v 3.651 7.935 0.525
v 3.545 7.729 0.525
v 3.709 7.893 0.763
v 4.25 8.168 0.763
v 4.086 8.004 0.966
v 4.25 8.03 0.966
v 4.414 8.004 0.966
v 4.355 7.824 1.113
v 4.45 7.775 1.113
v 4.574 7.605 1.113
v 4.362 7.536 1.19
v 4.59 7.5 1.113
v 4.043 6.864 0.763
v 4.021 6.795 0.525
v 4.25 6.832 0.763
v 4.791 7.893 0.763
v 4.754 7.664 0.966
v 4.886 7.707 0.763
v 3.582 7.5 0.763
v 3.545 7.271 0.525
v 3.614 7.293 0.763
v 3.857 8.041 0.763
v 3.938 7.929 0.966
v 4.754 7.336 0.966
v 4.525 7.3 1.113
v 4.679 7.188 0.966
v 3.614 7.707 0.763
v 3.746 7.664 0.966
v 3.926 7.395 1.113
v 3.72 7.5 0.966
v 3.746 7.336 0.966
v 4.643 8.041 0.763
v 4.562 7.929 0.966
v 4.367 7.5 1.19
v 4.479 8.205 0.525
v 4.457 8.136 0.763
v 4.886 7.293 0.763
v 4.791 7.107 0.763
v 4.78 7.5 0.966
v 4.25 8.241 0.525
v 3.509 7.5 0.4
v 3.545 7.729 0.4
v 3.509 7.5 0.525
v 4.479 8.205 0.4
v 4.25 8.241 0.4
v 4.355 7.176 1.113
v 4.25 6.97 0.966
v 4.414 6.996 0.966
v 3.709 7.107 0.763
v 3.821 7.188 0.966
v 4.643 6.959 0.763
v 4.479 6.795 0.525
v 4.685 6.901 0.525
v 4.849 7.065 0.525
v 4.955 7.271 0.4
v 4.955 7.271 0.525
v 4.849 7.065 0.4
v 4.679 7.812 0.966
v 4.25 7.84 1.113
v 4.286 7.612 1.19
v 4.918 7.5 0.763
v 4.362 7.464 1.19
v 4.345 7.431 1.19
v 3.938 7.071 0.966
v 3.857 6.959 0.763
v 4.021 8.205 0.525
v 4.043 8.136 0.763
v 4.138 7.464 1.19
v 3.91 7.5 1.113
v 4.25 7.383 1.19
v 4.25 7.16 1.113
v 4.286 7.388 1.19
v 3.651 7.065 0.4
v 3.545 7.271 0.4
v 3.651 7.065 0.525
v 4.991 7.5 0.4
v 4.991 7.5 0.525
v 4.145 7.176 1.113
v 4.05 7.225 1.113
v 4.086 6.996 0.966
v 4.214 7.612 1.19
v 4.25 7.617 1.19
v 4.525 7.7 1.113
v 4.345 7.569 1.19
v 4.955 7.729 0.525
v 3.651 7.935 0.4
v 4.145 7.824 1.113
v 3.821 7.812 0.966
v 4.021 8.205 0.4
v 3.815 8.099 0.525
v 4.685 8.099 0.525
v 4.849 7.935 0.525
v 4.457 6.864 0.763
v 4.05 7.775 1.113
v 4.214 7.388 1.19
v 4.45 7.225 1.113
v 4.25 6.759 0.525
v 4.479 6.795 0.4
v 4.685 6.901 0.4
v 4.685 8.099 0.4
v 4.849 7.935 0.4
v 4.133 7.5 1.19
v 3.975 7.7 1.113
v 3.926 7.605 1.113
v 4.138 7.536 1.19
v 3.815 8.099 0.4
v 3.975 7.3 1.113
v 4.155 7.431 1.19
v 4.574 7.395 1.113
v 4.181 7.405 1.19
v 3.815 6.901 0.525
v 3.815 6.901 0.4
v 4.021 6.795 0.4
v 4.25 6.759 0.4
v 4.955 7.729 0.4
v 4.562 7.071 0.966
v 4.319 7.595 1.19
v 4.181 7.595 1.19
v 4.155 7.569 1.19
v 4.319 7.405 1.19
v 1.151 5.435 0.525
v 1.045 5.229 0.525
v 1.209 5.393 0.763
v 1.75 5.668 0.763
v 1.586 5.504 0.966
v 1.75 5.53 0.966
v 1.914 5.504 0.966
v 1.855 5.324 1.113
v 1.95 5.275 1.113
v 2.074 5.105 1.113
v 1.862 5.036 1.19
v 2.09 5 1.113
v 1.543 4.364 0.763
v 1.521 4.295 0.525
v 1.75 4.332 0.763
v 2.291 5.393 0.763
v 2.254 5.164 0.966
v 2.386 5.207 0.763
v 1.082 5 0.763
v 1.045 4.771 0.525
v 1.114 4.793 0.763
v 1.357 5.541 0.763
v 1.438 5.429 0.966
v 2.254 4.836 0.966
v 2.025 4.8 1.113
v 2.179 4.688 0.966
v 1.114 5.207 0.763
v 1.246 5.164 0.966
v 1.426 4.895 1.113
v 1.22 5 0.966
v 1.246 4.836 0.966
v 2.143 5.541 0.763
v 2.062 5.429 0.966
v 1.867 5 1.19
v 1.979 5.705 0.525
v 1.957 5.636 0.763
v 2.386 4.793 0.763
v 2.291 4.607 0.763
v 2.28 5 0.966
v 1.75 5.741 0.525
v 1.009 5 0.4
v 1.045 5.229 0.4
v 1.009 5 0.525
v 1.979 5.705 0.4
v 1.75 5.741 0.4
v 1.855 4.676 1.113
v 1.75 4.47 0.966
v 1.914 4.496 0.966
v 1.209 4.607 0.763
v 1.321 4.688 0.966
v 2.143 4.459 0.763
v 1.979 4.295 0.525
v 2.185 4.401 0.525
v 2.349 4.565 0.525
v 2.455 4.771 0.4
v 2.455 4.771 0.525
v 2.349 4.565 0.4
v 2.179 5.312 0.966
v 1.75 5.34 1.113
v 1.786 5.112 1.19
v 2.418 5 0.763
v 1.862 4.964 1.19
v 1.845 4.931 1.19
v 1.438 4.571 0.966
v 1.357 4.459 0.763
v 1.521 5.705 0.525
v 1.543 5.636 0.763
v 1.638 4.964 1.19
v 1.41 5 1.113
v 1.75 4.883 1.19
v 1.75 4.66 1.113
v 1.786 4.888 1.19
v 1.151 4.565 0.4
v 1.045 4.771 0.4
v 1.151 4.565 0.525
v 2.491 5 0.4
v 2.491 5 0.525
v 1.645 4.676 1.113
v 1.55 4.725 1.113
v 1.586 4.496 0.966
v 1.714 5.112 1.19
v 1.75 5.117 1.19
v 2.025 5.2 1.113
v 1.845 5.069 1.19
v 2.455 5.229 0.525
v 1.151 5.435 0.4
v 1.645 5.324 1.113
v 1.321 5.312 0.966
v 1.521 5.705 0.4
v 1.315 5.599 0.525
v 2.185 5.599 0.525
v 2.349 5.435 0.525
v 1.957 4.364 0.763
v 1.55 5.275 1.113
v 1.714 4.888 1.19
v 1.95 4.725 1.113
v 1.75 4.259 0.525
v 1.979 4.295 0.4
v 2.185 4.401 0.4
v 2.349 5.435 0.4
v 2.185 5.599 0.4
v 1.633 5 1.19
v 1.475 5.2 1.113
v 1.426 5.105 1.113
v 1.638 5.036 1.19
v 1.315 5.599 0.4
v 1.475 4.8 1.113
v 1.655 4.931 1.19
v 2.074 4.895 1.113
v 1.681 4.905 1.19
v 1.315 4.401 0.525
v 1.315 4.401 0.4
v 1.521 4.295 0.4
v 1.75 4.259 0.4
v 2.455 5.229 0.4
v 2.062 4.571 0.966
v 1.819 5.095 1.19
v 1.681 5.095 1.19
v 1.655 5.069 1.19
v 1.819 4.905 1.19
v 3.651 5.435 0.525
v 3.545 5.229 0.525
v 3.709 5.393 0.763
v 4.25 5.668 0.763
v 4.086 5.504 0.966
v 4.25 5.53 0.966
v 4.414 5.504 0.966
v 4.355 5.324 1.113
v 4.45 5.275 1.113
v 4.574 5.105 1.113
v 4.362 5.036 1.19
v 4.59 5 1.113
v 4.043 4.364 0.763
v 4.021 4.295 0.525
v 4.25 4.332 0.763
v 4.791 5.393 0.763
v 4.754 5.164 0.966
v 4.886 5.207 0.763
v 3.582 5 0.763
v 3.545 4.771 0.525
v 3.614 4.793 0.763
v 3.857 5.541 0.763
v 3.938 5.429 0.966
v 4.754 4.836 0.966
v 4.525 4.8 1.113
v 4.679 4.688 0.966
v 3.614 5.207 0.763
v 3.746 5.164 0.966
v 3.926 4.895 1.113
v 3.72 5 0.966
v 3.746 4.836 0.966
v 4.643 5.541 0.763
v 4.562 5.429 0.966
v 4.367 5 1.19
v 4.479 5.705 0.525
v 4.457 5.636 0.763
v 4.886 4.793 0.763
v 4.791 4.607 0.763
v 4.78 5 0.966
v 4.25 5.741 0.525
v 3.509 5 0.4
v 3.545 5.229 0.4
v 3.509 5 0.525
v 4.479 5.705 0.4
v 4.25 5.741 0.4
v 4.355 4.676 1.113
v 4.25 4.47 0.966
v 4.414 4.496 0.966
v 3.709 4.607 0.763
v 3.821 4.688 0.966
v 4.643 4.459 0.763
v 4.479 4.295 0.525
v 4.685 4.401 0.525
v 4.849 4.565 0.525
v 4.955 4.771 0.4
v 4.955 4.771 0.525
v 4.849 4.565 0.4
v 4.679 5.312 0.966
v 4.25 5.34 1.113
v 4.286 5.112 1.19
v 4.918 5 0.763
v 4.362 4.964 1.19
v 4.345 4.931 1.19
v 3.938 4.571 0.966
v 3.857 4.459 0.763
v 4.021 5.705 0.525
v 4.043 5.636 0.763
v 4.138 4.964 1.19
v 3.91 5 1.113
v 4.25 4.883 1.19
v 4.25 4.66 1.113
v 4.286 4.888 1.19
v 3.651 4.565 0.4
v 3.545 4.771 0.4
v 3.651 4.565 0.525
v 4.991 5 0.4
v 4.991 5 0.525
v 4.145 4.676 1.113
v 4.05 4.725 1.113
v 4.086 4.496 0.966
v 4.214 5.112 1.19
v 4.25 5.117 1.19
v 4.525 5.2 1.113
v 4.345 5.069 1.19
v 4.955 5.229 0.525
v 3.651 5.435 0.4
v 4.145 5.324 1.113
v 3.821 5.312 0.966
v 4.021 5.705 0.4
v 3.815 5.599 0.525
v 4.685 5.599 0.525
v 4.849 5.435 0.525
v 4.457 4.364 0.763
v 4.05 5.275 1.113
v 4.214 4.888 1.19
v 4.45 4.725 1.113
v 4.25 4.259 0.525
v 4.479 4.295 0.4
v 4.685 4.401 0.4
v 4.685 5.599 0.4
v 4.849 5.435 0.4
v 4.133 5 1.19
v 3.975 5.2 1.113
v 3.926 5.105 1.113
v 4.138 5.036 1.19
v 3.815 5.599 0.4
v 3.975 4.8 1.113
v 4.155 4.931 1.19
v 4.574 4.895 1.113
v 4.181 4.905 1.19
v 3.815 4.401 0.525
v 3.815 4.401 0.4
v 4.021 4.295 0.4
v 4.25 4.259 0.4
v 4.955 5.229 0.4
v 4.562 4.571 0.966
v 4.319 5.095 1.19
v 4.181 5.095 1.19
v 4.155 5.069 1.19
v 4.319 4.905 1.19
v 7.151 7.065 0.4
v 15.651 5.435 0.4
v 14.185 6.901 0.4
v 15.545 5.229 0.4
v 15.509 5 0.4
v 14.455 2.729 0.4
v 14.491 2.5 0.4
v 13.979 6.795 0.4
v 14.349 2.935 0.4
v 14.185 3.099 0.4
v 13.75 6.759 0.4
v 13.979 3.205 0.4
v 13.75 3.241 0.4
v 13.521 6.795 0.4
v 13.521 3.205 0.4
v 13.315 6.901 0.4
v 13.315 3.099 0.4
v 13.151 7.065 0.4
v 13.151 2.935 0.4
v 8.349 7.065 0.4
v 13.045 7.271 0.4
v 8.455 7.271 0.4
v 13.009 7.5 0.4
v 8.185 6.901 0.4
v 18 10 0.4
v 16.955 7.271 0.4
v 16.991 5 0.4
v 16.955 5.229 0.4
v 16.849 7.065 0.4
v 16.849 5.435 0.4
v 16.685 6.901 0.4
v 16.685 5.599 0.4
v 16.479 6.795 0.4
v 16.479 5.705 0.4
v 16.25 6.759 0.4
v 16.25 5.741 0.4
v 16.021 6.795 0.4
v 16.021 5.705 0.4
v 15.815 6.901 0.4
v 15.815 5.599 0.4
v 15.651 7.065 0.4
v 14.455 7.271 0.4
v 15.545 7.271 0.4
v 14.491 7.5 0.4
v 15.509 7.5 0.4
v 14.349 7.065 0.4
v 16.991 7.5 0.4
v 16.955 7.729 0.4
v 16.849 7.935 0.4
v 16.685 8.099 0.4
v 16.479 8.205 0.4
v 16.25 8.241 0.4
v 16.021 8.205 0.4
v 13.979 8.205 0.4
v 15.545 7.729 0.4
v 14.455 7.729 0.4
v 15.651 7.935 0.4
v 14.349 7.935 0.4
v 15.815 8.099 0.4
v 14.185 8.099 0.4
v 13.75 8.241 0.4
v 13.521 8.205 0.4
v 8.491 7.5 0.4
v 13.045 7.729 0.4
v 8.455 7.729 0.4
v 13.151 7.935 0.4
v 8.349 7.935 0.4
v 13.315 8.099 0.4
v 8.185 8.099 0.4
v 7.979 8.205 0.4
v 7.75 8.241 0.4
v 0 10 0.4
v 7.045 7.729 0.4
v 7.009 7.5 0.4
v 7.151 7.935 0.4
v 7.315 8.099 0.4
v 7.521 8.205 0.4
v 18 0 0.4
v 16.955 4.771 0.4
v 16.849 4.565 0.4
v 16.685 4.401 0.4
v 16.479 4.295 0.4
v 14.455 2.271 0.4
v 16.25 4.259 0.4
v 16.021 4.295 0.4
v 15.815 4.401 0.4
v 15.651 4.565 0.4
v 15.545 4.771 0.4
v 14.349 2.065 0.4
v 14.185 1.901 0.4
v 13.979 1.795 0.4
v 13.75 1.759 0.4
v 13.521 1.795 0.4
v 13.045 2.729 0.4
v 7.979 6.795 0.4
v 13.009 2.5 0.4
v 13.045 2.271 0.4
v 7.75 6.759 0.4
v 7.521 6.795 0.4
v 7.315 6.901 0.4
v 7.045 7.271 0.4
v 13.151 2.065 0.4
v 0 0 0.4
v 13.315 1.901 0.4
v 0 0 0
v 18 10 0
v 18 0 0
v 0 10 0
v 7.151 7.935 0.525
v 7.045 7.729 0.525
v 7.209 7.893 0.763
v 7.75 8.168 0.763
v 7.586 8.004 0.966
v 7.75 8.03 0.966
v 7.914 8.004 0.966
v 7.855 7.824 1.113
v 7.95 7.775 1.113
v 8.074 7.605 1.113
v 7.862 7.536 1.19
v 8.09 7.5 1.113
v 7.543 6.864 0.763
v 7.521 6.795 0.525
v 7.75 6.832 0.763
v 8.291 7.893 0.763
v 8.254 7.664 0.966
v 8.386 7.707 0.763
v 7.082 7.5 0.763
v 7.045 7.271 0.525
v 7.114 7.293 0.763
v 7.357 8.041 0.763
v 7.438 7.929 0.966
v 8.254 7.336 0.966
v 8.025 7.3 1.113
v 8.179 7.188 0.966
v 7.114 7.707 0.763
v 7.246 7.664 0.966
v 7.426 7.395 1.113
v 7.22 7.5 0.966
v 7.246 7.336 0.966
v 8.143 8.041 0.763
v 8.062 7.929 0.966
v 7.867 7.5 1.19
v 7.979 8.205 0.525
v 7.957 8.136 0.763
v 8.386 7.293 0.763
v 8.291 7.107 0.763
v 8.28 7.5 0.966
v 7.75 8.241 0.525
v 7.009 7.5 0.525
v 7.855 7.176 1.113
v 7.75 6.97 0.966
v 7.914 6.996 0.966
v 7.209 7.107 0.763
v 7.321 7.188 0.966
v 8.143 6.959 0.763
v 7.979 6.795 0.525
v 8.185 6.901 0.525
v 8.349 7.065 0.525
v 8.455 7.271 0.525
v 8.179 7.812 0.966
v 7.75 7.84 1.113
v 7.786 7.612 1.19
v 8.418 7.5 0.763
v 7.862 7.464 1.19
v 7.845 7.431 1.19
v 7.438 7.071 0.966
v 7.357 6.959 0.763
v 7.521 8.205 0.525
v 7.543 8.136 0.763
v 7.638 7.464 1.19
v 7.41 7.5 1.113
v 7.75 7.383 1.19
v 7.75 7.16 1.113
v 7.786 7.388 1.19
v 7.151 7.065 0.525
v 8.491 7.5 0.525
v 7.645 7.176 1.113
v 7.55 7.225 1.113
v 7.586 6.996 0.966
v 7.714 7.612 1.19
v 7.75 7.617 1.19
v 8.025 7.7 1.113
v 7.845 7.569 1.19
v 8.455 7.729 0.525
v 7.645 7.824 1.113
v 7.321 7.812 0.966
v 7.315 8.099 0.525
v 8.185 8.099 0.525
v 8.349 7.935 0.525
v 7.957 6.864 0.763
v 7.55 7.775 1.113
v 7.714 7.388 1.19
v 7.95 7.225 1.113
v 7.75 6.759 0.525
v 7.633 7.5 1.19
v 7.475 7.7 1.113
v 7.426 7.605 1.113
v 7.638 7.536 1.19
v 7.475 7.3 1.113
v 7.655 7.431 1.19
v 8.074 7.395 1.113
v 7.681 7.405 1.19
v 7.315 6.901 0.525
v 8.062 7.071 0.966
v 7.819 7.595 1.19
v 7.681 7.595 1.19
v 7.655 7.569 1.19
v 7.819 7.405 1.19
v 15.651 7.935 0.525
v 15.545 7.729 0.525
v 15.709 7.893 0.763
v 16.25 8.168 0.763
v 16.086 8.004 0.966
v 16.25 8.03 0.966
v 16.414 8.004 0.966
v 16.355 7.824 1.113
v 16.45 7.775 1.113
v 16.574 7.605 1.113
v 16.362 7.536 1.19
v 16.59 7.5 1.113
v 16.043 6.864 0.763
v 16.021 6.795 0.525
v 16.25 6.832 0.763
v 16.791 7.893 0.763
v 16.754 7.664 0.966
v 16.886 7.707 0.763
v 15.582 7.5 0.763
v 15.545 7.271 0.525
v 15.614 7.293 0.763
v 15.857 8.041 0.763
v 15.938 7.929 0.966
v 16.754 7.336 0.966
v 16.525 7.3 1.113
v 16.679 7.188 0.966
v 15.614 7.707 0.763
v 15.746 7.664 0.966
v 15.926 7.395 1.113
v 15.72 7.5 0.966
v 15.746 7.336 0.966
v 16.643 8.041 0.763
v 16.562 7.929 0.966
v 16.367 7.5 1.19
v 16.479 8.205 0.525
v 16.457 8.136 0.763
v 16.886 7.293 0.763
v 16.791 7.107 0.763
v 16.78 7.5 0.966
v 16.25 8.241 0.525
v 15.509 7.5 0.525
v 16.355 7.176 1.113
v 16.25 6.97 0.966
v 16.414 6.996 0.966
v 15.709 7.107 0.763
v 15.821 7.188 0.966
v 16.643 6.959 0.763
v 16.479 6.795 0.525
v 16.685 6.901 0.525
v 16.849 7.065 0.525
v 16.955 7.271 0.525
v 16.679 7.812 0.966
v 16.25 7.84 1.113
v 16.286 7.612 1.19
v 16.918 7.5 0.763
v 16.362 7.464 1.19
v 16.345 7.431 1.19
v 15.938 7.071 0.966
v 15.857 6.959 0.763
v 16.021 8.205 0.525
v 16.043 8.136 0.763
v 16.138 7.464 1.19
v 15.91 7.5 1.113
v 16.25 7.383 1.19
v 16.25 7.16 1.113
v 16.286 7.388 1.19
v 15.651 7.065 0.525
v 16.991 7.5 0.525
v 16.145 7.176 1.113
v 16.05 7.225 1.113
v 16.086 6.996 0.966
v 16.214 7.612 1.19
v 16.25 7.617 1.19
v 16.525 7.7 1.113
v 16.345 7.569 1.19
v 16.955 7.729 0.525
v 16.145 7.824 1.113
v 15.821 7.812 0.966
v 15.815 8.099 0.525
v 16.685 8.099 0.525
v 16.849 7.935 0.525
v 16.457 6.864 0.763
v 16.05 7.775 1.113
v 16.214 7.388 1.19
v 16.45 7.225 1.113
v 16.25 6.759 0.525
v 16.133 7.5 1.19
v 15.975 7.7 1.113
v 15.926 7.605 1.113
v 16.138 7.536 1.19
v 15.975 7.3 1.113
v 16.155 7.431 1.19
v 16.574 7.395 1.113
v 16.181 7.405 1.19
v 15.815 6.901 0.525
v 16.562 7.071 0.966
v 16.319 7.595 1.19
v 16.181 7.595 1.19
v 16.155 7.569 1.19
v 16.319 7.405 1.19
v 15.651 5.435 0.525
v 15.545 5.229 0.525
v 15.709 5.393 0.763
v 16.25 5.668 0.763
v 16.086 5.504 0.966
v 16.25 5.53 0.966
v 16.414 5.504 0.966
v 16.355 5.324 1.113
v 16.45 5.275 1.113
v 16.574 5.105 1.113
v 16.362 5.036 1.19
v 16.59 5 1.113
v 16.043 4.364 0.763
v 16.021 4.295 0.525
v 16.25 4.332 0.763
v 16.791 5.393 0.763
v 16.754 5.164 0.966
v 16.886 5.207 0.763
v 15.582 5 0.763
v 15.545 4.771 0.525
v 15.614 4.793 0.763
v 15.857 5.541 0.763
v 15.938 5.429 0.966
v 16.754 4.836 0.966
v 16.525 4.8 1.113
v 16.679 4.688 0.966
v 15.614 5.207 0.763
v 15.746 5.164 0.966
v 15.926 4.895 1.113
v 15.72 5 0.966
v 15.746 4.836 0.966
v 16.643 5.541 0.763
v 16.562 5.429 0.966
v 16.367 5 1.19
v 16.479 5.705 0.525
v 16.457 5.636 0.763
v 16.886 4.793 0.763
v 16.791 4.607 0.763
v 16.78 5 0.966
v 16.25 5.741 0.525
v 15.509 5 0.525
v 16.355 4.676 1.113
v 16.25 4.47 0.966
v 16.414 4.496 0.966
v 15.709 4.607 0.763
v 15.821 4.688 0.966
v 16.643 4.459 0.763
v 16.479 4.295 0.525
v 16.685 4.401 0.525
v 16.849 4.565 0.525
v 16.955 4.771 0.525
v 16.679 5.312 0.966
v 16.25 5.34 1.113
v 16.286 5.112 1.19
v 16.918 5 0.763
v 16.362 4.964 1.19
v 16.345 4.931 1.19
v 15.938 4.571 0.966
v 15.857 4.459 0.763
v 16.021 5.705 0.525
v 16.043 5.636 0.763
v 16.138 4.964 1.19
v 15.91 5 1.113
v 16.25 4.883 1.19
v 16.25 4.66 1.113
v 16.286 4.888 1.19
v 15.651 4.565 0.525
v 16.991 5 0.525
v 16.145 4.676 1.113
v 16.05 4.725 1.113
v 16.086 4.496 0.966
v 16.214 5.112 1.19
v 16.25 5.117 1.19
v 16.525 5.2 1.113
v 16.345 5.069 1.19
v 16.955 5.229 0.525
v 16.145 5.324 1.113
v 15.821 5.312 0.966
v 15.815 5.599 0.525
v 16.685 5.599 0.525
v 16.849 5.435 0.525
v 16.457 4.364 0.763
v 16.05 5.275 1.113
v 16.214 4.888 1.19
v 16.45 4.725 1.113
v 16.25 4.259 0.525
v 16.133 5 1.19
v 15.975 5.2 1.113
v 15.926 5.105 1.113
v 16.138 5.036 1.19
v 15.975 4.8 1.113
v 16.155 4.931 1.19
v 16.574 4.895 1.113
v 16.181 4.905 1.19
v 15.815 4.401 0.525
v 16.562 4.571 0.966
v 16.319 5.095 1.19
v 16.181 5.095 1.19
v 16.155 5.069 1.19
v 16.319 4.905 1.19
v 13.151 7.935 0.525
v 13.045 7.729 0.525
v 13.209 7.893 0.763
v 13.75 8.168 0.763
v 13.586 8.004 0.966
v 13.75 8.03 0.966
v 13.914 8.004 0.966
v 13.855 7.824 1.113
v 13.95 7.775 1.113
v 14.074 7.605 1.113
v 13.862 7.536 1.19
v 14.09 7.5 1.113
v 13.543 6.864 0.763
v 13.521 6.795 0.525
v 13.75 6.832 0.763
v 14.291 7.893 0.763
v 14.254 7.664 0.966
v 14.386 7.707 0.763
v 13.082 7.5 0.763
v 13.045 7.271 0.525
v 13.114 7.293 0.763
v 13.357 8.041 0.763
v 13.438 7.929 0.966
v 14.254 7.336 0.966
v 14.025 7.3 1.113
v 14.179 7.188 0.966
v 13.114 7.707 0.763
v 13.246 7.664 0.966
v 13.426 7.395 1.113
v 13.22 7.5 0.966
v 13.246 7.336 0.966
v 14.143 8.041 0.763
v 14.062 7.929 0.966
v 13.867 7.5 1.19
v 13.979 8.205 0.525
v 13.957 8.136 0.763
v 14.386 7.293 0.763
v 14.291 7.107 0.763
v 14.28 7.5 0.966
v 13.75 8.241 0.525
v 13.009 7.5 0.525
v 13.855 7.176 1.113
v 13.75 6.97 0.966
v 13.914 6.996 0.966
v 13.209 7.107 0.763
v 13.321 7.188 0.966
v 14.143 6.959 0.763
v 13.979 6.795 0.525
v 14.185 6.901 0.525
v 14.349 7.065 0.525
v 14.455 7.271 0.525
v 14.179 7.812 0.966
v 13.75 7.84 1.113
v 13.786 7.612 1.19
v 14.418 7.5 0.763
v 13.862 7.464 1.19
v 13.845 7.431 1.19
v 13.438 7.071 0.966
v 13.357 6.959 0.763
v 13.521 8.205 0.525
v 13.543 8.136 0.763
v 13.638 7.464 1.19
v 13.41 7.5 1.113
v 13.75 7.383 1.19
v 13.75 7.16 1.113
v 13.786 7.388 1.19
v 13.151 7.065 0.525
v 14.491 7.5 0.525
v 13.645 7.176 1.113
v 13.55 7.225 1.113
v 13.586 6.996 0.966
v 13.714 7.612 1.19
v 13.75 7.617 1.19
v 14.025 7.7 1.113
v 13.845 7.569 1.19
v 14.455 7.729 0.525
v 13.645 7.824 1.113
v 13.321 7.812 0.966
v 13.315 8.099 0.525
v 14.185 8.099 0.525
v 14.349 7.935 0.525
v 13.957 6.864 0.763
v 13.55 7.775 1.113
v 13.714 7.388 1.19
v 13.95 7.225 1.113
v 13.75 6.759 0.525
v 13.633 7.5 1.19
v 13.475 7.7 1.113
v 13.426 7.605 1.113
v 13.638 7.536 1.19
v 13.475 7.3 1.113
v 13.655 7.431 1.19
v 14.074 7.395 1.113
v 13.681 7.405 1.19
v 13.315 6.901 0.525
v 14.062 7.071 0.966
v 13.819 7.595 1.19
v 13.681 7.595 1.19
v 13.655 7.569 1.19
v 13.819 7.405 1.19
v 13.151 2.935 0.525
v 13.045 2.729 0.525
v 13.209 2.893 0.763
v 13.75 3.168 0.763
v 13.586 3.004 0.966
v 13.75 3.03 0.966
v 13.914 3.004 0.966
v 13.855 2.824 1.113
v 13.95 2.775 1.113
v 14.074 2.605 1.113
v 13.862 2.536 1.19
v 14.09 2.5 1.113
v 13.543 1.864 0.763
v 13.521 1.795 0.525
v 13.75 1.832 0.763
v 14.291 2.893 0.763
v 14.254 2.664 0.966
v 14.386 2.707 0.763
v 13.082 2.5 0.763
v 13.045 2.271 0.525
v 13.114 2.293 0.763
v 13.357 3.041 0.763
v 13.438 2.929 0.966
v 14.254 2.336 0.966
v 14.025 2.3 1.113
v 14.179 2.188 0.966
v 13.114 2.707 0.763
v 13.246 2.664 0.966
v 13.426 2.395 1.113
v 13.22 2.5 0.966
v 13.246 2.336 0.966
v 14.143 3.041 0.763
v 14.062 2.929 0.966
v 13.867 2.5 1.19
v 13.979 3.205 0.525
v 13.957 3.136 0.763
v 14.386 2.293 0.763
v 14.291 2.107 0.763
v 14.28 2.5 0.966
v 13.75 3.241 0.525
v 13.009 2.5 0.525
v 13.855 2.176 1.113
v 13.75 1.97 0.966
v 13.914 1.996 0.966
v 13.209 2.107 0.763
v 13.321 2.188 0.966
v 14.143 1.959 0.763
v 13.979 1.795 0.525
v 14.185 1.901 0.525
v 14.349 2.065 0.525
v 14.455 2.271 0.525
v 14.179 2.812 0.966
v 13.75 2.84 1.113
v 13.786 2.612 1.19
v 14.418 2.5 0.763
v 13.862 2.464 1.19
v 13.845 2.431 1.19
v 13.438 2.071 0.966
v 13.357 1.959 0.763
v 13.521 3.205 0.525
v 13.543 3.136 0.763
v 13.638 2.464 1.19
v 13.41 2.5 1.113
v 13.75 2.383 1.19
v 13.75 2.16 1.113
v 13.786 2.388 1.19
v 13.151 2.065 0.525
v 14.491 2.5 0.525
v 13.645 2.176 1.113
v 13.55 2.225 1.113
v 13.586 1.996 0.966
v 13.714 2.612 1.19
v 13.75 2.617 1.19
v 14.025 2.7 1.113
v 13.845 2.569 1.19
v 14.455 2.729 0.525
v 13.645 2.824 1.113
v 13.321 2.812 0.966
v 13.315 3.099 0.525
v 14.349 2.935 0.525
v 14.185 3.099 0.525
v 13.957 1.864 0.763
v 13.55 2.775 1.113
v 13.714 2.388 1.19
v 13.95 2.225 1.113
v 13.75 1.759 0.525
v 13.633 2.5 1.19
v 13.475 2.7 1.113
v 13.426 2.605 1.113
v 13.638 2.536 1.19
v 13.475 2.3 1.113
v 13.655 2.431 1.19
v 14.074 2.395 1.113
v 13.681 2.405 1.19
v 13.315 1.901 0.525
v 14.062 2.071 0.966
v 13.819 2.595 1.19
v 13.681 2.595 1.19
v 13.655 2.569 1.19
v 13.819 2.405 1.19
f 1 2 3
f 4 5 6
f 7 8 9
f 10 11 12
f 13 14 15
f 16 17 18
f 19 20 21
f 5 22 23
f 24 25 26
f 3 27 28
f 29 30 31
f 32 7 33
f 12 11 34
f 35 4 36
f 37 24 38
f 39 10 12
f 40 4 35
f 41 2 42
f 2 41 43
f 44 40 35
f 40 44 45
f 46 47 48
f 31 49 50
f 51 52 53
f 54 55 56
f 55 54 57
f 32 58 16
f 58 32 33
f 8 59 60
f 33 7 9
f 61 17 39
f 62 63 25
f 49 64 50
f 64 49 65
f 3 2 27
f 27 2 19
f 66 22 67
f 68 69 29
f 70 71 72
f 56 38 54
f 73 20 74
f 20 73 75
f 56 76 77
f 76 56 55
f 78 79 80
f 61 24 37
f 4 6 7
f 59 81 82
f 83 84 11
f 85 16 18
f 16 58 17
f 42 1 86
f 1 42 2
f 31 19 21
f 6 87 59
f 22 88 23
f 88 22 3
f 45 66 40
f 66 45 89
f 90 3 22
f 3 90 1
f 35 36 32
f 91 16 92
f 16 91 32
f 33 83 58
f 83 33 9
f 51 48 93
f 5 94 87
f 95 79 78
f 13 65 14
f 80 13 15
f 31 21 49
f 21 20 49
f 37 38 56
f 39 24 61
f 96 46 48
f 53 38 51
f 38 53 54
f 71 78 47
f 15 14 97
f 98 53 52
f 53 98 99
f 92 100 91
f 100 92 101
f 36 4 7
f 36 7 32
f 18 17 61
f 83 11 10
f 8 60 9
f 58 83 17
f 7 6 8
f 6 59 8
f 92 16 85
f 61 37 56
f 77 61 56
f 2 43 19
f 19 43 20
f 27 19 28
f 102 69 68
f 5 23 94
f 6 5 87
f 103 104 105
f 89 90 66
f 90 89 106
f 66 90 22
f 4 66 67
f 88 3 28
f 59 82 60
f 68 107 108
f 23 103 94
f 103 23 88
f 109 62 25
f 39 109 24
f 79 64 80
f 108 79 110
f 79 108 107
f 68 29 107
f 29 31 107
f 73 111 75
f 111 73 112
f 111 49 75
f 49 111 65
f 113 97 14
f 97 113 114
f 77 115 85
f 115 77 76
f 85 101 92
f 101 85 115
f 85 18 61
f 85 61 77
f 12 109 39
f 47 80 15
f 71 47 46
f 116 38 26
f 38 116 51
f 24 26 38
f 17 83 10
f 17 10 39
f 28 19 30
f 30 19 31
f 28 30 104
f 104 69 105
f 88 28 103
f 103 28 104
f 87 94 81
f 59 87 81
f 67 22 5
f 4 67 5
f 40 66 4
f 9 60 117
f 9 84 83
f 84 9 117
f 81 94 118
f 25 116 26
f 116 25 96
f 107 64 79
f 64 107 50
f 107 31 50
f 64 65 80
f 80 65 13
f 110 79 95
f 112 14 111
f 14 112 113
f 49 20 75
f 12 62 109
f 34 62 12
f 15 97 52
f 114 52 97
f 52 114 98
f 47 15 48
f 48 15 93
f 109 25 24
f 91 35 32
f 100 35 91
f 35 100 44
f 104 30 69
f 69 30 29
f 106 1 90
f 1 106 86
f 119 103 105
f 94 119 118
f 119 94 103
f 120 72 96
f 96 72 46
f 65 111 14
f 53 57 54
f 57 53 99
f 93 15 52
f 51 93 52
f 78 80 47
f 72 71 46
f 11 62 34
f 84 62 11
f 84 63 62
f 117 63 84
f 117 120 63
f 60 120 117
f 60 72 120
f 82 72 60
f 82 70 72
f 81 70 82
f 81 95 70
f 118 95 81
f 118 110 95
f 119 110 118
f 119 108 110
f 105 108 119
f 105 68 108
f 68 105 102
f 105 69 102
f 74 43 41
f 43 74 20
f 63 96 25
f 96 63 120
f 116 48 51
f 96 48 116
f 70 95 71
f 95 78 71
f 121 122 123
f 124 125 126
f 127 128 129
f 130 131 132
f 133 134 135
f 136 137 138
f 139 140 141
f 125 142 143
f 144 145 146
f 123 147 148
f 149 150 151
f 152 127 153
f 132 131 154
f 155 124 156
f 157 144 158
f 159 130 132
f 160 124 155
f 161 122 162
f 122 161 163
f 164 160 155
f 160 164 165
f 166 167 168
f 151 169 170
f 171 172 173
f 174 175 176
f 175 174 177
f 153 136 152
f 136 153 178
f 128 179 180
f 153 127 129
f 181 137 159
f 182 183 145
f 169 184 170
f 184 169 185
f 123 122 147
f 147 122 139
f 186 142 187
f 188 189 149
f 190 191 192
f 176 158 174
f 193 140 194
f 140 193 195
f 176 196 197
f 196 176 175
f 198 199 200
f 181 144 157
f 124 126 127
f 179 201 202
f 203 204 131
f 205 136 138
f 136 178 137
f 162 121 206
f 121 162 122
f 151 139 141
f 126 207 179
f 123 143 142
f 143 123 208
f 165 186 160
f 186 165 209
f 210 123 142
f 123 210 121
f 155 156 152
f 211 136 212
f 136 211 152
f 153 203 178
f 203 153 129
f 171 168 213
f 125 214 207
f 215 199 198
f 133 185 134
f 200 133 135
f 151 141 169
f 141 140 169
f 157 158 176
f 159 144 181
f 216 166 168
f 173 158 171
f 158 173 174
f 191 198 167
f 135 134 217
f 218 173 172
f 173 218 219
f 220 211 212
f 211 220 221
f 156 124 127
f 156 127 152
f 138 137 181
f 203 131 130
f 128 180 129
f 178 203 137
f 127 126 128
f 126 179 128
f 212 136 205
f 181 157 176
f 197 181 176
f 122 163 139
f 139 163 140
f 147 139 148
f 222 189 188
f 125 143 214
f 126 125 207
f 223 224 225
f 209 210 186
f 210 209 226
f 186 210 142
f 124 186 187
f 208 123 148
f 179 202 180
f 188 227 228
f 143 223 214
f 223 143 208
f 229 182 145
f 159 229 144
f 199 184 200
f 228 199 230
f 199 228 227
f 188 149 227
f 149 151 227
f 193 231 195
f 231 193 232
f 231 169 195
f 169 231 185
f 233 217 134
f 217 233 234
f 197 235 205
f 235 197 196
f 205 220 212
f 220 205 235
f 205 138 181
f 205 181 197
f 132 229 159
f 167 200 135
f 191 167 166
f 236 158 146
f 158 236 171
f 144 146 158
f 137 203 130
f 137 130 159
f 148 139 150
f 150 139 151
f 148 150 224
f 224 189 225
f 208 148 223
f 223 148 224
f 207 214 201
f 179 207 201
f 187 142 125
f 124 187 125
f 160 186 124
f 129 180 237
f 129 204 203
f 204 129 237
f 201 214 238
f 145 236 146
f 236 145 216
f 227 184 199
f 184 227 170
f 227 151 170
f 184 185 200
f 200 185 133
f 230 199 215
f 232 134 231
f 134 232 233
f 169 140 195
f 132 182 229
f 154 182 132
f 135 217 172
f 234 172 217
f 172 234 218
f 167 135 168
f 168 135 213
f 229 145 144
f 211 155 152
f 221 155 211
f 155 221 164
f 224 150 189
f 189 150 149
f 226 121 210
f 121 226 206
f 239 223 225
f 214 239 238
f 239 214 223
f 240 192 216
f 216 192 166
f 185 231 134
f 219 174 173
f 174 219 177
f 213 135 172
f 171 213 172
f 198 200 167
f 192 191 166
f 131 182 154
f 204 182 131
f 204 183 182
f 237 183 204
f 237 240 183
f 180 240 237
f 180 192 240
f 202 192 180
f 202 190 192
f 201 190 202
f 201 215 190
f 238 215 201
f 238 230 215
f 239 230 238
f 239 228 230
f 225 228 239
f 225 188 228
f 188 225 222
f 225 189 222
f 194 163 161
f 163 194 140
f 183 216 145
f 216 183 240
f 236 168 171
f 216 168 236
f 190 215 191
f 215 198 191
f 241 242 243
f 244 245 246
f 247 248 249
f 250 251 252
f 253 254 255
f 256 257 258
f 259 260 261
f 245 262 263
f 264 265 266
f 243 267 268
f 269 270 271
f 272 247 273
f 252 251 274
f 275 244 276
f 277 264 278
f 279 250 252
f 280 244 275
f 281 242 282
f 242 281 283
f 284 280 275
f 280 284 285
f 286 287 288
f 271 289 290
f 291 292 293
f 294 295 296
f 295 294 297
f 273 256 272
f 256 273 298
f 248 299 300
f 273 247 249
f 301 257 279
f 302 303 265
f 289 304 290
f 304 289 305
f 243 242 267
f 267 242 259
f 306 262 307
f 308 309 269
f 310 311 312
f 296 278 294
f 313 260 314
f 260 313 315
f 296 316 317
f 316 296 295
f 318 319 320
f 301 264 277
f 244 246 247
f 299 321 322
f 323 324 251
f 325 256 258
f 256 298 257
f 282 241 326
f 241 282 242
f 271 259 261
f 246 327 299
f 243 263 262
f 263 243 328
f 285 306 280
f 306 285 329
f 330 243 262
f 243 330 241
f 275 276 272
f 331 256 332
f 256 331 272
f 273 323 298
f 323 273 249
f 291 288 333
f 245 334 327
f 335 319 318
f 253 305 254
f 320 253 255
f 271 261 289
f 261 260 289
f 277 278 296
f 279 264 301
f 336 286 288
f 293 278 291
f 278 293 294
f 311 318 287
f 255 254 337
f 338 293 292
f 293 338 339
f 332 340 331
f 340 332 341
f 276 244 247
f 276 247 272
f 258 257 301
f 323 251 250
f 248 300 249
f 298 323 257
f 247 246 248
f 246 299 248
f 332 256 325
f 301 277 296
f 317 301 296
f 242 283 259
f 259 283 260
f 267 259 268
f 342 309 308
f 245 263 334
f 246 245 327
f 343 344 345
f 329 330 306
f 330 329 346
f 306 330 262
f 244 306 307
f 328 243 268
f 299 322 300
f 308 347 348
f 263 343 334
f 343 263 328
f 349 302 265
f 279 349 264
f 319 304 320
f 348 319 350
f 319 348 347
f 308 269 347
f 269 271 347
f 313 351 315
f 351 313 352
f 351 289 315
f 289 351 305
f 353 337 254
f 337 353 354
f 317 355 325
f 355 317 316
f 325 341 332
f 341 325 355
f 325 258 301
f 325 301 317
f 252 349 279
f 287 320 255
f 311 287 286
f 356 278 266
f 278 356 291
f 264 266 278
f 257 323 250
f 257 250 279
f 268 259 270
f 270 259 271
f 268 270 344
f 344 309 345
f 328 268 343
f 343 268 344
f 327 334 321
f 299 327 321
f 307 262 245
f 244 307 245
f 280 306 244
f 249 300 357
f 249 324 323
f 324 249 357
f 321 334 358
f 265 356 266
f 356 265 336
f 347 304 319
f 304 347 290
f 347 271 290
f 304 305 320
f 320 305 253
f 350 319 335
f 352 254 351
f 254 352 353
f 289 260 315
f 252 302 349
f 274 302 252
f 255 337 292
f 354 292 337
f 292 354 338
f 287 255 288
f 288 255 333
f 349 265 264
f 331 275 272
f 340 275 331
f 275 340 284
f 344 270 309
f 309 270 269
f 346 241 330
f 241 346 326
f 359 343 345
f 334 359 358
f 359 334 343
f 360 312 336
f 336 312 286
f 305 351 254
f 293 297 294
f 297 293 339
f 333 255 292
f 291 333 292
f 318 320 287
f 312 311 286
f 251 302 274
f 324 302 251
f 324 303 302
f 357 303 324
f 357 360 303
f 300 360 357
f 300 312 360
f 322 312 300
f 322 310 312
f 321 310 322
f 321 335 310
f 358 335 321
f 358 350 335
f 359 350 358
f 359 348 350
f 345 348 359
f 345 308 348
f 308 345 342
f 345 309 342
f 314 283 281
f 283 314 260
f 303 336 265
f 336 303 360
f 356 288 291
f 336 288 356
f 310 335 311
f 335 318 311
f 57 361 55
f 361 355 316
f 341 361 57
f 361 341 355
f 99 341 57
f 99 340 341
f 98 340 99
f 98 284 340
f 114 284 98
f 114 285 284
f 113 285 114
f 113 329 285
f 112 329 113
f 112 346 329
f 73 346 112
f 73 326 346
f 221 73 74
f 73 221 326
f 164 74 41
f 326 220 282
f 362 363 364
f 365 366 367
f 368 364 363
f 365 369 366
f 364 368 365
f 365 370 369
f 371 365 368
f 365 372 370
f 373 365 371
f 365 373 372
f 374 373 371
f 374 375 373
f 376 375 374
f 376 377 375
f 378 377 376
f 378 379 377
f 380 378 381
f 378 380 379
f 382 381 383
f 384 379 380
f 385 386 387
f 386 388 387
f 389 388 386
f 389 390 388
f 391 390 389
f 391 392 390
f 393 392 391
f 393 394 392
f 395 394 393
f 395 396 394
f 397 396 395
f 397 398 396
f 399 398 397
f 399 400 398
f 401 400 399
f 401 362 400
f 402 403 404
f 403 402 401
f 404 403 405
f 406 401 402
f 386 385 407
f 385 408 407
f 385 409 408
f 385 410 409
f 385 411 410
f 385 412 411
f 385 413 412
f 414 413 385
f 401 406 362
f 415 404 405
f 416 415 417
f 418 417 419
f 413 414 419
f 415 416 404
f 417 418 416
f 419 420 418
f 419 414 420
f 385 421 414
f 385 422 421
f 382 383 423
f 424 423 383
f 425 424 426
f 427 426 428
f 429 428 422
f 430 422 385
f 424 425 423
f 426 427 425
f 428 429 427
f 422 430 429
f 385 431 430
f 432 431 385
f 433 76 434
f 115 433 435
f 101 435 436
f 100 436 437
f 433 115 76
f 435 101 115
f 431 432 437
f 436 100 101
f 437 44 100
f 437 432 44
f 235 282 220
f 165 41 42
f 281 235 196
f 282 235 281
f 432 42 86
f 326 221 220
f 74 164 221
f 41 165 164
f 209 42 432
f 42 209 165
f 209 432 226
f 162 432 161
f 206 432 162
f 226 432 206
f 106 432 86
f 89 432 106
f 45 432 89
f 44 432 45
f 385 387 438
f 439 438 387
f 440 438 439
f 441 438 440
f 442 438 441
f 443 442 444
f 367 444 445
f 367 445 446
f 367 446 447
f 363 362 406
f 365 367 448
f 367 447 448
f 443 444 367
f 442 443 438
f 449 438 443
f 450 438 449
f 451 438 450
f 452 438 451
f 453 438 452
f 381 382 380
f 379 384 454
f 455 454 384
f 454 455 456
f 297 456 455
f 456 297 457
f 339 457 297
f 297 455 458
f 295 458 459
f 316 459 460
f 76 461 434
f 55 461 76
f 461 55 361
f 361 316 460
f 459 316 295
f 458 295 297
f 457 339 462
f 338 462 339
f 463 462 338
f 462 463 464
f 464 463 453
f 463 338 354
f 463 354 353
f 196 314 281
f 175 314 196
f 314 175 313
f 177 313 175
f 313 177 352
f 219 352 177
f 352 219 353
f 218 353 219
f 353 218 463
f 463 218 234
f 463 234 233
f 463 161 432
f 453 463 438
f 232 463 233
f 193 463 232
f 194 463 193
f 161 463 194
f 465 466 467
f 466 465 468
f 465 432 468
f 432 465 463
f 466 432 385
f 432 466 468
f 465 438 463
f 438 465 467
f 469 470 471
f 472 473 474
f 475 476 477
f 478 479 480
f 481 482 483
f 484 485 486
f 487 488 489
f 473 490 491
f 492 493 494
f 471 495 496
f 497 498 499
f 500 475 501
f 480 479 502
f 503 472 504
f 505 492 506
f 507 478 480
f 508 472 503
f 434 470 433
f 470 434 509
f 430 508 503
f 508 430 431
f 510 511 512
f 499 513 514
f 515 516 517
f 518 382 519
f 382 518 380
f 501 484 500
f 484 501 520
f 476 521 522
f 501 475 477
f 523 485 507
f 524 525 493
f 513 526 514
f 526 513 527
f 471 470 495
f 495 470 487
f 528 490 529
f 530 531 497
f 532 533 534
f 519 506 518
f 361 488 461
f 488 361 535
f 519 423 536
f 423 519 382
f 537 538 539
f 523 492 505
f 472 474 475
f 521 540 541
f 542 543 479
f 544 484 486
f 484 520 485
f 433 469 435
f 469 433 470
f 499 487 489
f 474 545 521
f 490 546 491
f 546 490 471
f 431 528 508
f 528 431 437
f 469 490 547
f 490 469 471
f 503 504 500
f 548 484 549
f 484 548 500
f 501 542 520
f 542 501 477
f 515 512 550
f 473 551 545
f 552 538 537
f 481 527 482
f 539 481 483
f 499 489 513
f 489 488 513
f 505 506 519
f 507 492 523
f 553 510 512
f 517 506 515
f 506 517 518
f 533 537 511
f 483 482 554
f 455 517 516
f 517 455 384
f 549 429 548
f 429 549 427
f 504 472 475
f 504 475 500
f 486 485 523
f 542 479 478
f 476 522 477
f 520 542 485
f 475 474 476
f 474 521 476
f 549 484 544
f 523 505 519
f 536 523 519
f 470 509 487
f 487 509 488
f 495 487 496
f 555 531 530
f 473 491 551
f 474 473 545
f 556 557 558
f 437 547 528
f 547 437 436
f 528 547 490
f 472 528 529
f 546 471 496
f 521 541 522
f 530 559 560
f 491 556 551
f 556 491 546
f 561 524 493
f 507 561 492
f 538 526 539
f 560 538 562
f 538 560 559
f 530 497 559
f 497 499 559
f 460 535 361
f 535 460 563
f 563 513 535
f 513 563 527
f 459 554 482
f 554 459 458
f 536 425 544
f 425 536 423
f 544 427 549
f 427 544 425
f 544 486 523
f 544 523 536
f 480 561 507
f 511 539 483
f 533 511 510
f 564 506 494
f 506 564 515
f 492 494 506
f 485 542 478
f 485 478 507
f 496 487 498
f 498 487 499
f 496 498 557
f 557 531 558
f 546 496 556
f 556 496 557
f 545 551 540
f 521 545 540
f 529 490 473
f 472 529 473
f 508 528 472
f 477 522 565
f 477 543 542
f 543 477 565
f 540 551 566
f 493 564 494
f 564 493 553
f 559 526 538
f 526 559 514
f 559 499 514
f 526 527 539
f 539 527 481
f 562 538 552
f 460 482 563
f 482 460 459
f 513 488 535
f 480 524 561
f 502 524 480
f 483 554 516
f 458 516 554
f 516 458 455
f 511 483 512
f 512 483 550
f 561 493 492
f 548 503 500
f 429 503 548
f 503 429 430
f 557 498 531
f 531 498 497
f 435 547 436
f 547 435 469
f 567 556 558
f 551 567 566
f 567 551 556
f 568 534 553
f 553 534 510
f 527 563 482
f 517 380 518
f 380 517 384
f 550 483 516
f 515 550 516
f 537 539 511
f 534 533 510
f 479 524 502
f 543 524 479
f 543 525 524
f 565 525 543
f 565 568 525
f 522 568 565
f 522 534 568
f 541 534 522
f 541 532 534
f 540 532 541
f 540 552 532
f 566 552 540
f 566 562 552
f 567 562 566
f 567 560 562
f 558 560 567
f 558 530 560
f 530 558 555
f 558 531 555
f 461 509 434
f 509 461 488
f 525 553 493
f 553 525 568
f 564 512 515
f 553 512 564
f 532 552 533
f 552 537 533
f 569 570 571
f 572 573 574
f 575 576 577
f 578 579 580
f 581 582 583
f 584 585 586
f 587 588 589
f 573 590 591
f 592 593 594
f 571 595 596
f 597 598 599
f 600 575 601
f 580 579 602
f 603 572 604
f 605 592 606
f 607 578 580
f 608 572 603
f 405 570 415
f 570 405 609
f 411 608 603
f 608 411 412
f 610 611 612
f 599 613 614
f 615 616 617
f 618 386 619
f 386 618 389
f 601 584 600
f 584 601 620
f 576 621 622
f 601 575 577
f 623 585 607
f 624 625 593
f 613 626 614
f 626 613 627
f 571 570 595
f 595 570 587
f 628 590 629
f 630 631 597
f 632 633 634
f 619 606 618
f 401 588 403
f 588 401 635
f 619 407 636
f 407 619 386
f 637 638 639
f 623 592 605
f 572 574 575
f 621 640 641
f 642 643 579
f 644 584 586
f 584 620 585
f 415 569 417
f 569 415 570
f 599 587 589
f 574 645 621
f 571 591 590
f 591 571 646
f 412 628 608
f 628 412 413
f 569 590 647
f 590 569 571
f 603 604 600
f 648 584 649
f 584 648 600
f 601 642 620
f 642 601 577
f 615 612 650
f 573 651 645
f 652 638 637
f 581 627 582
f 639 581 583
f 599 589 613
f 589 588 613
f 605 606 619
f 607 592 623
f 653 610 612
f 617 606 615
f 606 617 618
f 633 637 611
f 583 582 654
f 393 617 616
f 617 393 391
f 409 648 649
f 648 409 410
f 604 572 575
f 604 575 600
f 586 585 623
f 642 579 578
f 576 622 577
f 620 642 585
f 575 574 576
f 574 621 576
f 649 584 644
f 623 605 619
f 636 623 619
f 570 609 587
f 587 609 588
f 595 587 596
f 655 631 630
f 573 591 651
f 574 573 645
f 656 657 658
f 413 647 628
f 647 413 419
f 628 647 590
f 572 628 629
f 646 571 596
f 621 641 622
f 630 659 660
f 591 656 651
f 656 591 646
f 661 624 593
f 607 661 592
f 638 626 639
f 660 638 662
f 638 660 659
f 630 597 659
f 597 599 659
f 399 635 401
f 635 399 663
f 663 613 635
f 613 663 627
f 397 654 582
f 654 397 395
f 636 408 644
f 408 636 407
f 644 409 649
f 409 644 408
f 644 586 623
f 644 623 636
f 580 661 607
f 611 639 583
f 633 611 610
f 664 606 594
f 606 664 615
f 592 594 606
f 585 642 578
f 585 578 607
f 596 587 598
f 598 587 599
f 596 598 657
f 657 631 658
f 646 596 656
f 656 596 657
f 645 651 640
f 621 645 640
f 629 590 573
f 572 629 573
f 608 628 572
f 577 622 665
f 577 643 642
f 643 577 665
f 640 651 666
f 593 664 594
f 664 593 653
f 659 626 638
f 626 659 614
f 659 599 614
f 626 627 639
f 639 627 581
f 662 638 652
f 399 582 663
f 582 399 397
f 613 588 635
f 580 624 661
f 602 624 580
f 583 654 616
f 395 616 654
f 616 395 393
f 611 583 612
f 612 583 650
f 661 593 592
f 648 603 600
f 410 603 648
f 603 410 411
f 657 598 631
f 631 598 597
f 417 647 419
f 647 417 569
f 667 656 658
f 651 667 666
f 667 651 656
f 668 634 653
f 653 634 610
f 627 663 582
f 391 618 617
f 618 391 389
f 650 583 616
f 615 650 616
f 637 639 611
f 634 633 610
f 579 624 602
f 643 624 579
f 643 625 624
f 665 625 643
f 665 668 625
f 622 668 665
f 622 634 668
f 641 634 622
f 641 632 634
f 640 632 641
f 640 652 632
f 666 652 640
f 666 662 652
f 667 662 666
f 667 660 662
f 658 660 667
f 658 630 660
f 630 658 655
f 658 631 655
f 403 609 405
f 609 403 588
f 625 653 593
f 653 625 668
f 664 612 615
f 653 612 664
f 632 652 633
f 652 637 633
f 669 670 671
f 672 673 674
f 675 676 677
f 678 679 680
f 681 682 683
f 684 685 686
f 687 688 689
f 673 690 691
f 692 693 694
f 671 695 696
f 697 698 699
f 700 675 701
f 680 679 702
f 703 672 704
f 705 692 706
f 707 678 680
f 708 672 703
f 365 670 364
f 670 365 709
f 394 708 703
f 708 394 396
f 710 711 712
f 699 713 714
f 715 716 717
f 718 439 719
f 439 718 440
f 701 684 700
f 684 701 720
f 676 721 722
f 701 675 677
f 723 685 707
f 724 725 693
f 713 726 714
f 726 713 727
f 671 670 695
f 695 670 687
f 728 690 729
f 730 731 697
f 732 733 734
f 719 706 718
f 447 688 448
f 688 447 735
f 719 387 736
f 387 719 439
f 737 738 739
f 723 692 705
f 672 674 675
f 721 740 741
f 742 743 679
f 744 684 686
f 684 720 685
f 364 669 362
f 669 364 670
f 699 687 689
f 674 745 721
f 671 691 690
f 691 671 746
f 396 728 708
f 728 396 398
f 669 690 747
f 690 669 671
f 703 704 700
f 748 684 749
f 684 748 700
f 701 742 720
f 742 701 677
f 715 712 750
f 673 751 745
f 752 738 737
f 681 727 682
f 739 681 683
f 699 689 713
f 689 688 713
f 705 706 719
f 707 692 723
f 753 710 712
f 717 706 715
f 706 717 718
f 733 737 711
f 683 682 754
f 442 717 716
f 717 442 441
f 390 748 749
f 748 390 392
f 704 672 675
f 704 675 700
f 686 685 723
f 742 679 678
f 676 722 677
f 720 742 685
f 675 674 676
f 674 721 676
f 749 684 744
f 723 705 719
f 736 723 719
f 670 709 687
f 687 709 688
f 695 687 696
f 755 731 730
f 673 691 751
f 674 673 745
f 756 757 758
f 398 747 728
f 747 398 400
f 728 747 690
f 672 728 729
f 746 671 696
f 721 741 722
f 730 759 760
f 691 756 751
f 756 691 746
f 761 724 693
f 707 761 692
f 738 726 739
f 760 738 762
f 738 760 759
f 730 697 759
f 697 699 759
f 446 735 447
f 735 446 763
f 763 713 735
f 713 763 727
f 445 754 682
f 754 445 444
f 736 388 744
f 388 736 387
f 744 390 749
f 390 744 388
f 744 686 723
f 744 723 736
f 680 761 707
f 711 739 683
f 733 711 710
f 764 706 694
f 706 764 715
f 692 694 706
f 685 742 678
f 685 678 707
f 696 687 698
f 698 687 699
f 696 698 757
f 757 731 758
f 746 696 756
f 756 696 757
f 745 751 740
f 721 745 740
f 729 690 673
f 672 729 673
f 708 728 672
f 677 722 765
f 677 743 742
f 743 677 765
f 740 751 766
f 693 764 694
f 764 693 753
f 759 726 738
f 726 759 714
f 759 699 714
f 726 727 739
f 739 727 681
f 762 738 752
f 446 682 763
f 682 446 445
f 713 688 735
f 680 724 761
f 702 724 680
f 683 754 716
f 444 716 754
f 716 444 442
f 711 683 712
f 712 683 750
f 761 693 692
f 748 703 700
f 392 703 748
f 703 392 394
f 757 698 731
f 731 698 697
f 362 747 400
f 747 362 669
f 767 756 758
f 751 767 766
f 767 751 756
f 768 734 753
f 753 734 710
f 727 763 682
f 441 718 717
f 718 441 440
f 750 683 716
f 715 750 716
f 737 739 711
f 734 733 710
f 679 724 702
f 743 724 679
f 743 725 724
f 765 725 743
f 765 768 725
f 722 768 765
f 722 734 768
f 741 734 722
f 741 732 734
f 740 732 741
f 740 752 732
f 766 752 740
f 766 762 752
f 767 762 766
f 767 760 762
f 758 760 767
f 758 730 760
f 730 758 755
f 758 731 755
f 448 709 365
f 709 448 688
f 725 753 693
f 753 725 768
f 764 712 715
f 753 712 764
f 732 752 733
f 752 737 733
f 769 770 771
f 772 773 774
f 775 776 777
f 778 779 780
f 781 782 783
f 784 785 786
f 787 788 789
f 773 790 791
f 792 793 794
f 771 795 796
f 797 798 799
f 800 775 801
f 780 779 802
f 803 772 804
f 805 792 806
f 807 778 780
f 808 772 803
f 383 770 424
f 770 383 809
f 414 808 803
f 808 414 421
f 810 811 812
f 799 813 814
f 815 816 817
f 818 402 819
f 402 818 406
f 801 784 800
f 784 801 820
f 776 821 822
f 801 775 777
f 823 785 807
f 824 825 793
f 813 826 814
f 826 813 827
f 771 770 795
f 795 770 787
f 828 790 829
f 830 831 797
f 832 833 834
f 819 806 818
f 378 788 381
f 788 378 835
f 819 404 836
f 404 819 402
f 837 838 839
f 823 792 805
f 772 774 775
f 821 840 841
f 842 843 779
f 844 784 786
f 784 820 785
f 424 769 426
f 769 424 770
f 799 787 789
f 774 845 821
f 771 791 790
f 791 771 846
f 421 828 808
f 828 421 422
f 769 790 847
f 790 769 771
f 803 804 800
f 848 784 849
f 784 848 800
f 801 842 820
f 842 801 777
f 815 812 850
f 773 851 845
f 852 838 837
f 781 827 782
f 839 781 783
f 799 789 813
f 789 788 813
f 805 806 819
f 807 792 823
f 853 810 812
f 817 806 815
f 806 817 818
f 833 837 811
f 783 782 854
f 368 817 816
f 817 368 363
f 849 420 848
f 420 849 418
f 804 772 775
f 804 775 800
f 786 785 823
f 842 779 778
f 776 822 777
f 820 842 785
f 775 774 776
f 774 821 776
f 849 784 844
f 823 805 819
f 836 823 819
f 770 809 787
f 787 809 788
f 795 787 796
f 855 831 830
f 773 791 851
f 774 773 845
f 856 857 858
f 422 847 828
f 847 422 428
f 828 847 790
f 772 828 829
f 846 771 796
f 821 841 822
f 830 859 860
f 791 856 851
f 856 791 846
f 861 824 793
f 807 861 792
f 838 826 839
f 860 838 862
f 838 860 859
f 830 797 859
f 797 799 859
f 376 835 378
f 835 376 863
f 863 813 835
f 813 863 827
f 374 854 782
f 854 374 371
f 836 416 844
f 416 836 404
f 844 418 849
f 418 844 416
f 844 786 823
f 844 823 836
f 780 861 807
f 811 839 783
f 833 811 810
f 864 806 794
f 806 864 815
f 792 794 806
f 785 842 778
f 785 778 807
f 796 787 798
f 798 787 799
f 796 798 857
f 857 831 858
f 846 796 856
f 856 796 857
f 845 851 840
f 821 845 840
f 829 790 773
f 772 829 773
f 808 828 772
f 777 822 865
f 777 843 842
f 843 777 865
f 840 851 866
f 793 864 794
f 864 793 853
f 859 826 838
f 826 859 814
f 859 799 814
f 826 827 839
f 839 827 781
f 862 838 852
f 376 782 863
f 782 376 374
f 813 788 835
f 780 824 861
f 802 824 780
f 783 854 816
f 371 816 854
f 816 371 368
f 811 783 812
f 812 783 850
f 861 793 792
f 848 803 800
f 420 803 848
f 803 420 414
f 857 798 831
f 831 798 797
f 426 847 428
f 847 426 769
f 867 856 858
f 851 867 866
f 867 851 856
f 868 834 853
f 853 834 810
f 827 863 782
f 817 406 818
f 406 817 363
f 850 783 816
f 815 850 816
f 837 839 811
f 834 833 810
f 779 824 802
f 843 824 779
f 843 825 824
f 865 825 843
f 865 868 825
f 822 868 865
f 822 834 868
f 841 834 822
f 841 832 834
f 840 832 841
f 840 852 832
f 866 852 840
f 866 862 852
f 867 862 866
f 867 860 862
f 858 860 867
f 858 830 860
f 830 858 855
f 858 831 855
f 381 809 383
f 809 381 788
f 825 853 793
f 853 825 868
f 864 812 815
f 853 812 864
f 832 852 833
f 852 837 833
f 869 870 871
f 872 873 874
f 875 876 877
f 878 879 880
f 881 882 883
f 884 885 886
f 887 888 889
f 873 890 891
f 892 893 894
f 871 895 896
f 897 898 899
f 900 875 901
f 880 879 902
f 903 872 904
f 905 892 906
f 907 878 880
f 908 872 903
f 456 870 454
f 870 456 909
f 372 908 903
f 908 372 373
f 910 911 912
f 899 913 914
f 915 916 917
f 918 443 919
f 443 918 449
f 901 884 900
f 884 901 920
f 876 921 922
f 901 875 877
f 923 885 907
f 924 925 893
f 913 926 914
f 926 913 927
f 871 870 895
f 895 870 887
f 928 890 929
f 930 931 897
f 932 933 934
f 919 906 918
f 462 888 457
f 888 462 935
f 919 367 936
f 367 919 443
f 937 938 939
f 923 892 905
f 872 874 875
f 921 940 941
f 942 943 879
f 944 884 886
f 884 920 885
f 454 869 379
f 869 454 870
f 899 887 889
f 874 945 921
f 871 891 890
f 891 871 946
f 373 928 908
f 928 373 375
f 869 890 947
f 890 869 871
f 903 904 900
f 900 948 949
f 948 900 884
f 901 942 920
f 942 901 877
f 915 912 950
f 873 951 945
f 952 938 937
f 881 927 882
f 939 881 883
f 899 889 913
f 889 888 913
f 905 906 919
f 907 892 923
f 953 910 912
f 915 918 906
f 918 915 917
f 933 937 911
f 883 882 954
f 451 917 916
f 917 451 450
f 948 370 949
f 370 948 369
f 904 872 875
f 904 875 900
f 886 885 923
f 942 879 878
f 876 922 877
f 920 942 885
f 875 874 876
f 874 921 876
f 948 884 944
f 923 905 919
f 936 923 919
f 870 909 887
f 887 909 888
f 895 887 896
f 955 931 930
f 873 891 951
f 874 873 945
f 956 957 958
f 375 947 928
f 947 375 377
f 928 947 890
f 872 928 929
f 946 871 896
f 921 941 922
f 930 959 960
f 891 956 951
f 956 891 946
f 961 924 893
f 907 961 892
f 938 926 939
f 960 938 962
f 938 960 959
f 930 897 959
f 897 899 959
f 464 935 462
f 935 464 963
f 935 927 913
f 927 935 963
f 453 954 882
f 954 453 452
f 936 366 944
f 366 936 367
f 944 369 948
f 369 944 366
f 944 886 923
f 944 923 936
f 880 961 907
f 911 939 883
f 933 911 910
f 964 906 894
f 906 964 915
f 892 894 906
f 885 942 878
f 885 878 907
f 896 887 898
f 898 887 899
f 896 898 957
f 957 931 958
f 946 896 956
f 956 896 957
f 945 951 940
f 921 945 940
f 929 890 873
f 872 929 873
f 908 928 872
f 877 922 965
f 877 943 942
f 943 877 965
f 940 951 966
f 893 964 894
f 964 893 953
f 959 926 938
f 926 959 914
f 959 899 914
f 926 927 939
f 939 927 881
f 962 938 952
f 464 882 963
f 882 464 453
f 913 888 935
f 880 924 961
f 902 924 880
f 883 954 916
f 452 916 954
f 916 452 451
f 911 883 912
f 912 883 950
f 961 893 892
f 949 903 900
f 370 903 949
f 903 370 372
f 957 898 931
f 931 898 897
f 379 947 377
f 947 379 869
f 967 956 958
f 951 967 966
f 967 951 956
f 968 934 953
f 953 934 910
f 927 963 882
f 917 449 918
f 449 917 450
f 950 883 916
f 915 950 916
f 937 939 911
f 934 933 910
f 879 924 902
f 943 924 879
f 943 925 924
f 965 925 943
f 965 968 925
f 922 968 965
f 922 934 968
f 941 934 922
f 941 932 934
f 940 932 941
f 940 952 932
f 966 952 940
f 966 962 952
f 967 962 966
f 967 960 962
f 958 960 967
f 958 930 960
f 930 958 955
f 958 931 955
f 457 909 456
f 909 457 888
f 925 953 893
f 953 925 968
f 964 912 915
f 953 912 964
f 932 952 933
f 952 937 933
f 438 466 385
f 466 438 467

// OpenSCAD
dot_distance = 2.5;
dot_diameter = 1.5;
dot_height = 0.8;

form_distance = 6;
line_height = 10;

plate_height = 0.4;

$fn = 20;

module form_base()
{
	cube([form_distance, line_height, plate_height]);
}

module dot(x, y)
{
	x_pos = (form_distance - dot_distance) / 2 + (x-1) * dot_distance;
	y_pos = (line_height - dot_distance*2) / 2 + (3-y) * dot_distance;
	translate([x_pos, y_pos, plate_height])
	scale([dot_diameter/2, dot_diameter/2, dot_height])
	render()
	difference()
	{
//		cylinder(r=1, h=2, center=true);
		sphere(r=1);
		translate([0, 0, -1.05])
		cube([2.5, 2.5, 2], center=true);
	}
}

module full()
{
	union()
	{
		//form_base();
		dot(1,1);
		dot(2,1);
		dot(1,2);
		dot(2,2);
		dot(1,3);
		dot(2,3);
	}
}

module char_a()
{
	union()
	{
		form_base();
		dot(1,1);
	}
}

module char_j()
{
	union()
	{
		form_base();
		dot(2,1);
		dot(1,2);
		dot(2,2);
	}
}

module char_n()
{
	union()
	{
		form_base();
		dot(1,1);
		dot(2,1);
		dot(2,2);
		dot(1,3);
	}
}

render()
union()
{
//	full();
	char_j();
	translate([form_distance, 0, 0])
	char_a();
	translate([form_distance*2, 0, 0])
	char_n();
}
